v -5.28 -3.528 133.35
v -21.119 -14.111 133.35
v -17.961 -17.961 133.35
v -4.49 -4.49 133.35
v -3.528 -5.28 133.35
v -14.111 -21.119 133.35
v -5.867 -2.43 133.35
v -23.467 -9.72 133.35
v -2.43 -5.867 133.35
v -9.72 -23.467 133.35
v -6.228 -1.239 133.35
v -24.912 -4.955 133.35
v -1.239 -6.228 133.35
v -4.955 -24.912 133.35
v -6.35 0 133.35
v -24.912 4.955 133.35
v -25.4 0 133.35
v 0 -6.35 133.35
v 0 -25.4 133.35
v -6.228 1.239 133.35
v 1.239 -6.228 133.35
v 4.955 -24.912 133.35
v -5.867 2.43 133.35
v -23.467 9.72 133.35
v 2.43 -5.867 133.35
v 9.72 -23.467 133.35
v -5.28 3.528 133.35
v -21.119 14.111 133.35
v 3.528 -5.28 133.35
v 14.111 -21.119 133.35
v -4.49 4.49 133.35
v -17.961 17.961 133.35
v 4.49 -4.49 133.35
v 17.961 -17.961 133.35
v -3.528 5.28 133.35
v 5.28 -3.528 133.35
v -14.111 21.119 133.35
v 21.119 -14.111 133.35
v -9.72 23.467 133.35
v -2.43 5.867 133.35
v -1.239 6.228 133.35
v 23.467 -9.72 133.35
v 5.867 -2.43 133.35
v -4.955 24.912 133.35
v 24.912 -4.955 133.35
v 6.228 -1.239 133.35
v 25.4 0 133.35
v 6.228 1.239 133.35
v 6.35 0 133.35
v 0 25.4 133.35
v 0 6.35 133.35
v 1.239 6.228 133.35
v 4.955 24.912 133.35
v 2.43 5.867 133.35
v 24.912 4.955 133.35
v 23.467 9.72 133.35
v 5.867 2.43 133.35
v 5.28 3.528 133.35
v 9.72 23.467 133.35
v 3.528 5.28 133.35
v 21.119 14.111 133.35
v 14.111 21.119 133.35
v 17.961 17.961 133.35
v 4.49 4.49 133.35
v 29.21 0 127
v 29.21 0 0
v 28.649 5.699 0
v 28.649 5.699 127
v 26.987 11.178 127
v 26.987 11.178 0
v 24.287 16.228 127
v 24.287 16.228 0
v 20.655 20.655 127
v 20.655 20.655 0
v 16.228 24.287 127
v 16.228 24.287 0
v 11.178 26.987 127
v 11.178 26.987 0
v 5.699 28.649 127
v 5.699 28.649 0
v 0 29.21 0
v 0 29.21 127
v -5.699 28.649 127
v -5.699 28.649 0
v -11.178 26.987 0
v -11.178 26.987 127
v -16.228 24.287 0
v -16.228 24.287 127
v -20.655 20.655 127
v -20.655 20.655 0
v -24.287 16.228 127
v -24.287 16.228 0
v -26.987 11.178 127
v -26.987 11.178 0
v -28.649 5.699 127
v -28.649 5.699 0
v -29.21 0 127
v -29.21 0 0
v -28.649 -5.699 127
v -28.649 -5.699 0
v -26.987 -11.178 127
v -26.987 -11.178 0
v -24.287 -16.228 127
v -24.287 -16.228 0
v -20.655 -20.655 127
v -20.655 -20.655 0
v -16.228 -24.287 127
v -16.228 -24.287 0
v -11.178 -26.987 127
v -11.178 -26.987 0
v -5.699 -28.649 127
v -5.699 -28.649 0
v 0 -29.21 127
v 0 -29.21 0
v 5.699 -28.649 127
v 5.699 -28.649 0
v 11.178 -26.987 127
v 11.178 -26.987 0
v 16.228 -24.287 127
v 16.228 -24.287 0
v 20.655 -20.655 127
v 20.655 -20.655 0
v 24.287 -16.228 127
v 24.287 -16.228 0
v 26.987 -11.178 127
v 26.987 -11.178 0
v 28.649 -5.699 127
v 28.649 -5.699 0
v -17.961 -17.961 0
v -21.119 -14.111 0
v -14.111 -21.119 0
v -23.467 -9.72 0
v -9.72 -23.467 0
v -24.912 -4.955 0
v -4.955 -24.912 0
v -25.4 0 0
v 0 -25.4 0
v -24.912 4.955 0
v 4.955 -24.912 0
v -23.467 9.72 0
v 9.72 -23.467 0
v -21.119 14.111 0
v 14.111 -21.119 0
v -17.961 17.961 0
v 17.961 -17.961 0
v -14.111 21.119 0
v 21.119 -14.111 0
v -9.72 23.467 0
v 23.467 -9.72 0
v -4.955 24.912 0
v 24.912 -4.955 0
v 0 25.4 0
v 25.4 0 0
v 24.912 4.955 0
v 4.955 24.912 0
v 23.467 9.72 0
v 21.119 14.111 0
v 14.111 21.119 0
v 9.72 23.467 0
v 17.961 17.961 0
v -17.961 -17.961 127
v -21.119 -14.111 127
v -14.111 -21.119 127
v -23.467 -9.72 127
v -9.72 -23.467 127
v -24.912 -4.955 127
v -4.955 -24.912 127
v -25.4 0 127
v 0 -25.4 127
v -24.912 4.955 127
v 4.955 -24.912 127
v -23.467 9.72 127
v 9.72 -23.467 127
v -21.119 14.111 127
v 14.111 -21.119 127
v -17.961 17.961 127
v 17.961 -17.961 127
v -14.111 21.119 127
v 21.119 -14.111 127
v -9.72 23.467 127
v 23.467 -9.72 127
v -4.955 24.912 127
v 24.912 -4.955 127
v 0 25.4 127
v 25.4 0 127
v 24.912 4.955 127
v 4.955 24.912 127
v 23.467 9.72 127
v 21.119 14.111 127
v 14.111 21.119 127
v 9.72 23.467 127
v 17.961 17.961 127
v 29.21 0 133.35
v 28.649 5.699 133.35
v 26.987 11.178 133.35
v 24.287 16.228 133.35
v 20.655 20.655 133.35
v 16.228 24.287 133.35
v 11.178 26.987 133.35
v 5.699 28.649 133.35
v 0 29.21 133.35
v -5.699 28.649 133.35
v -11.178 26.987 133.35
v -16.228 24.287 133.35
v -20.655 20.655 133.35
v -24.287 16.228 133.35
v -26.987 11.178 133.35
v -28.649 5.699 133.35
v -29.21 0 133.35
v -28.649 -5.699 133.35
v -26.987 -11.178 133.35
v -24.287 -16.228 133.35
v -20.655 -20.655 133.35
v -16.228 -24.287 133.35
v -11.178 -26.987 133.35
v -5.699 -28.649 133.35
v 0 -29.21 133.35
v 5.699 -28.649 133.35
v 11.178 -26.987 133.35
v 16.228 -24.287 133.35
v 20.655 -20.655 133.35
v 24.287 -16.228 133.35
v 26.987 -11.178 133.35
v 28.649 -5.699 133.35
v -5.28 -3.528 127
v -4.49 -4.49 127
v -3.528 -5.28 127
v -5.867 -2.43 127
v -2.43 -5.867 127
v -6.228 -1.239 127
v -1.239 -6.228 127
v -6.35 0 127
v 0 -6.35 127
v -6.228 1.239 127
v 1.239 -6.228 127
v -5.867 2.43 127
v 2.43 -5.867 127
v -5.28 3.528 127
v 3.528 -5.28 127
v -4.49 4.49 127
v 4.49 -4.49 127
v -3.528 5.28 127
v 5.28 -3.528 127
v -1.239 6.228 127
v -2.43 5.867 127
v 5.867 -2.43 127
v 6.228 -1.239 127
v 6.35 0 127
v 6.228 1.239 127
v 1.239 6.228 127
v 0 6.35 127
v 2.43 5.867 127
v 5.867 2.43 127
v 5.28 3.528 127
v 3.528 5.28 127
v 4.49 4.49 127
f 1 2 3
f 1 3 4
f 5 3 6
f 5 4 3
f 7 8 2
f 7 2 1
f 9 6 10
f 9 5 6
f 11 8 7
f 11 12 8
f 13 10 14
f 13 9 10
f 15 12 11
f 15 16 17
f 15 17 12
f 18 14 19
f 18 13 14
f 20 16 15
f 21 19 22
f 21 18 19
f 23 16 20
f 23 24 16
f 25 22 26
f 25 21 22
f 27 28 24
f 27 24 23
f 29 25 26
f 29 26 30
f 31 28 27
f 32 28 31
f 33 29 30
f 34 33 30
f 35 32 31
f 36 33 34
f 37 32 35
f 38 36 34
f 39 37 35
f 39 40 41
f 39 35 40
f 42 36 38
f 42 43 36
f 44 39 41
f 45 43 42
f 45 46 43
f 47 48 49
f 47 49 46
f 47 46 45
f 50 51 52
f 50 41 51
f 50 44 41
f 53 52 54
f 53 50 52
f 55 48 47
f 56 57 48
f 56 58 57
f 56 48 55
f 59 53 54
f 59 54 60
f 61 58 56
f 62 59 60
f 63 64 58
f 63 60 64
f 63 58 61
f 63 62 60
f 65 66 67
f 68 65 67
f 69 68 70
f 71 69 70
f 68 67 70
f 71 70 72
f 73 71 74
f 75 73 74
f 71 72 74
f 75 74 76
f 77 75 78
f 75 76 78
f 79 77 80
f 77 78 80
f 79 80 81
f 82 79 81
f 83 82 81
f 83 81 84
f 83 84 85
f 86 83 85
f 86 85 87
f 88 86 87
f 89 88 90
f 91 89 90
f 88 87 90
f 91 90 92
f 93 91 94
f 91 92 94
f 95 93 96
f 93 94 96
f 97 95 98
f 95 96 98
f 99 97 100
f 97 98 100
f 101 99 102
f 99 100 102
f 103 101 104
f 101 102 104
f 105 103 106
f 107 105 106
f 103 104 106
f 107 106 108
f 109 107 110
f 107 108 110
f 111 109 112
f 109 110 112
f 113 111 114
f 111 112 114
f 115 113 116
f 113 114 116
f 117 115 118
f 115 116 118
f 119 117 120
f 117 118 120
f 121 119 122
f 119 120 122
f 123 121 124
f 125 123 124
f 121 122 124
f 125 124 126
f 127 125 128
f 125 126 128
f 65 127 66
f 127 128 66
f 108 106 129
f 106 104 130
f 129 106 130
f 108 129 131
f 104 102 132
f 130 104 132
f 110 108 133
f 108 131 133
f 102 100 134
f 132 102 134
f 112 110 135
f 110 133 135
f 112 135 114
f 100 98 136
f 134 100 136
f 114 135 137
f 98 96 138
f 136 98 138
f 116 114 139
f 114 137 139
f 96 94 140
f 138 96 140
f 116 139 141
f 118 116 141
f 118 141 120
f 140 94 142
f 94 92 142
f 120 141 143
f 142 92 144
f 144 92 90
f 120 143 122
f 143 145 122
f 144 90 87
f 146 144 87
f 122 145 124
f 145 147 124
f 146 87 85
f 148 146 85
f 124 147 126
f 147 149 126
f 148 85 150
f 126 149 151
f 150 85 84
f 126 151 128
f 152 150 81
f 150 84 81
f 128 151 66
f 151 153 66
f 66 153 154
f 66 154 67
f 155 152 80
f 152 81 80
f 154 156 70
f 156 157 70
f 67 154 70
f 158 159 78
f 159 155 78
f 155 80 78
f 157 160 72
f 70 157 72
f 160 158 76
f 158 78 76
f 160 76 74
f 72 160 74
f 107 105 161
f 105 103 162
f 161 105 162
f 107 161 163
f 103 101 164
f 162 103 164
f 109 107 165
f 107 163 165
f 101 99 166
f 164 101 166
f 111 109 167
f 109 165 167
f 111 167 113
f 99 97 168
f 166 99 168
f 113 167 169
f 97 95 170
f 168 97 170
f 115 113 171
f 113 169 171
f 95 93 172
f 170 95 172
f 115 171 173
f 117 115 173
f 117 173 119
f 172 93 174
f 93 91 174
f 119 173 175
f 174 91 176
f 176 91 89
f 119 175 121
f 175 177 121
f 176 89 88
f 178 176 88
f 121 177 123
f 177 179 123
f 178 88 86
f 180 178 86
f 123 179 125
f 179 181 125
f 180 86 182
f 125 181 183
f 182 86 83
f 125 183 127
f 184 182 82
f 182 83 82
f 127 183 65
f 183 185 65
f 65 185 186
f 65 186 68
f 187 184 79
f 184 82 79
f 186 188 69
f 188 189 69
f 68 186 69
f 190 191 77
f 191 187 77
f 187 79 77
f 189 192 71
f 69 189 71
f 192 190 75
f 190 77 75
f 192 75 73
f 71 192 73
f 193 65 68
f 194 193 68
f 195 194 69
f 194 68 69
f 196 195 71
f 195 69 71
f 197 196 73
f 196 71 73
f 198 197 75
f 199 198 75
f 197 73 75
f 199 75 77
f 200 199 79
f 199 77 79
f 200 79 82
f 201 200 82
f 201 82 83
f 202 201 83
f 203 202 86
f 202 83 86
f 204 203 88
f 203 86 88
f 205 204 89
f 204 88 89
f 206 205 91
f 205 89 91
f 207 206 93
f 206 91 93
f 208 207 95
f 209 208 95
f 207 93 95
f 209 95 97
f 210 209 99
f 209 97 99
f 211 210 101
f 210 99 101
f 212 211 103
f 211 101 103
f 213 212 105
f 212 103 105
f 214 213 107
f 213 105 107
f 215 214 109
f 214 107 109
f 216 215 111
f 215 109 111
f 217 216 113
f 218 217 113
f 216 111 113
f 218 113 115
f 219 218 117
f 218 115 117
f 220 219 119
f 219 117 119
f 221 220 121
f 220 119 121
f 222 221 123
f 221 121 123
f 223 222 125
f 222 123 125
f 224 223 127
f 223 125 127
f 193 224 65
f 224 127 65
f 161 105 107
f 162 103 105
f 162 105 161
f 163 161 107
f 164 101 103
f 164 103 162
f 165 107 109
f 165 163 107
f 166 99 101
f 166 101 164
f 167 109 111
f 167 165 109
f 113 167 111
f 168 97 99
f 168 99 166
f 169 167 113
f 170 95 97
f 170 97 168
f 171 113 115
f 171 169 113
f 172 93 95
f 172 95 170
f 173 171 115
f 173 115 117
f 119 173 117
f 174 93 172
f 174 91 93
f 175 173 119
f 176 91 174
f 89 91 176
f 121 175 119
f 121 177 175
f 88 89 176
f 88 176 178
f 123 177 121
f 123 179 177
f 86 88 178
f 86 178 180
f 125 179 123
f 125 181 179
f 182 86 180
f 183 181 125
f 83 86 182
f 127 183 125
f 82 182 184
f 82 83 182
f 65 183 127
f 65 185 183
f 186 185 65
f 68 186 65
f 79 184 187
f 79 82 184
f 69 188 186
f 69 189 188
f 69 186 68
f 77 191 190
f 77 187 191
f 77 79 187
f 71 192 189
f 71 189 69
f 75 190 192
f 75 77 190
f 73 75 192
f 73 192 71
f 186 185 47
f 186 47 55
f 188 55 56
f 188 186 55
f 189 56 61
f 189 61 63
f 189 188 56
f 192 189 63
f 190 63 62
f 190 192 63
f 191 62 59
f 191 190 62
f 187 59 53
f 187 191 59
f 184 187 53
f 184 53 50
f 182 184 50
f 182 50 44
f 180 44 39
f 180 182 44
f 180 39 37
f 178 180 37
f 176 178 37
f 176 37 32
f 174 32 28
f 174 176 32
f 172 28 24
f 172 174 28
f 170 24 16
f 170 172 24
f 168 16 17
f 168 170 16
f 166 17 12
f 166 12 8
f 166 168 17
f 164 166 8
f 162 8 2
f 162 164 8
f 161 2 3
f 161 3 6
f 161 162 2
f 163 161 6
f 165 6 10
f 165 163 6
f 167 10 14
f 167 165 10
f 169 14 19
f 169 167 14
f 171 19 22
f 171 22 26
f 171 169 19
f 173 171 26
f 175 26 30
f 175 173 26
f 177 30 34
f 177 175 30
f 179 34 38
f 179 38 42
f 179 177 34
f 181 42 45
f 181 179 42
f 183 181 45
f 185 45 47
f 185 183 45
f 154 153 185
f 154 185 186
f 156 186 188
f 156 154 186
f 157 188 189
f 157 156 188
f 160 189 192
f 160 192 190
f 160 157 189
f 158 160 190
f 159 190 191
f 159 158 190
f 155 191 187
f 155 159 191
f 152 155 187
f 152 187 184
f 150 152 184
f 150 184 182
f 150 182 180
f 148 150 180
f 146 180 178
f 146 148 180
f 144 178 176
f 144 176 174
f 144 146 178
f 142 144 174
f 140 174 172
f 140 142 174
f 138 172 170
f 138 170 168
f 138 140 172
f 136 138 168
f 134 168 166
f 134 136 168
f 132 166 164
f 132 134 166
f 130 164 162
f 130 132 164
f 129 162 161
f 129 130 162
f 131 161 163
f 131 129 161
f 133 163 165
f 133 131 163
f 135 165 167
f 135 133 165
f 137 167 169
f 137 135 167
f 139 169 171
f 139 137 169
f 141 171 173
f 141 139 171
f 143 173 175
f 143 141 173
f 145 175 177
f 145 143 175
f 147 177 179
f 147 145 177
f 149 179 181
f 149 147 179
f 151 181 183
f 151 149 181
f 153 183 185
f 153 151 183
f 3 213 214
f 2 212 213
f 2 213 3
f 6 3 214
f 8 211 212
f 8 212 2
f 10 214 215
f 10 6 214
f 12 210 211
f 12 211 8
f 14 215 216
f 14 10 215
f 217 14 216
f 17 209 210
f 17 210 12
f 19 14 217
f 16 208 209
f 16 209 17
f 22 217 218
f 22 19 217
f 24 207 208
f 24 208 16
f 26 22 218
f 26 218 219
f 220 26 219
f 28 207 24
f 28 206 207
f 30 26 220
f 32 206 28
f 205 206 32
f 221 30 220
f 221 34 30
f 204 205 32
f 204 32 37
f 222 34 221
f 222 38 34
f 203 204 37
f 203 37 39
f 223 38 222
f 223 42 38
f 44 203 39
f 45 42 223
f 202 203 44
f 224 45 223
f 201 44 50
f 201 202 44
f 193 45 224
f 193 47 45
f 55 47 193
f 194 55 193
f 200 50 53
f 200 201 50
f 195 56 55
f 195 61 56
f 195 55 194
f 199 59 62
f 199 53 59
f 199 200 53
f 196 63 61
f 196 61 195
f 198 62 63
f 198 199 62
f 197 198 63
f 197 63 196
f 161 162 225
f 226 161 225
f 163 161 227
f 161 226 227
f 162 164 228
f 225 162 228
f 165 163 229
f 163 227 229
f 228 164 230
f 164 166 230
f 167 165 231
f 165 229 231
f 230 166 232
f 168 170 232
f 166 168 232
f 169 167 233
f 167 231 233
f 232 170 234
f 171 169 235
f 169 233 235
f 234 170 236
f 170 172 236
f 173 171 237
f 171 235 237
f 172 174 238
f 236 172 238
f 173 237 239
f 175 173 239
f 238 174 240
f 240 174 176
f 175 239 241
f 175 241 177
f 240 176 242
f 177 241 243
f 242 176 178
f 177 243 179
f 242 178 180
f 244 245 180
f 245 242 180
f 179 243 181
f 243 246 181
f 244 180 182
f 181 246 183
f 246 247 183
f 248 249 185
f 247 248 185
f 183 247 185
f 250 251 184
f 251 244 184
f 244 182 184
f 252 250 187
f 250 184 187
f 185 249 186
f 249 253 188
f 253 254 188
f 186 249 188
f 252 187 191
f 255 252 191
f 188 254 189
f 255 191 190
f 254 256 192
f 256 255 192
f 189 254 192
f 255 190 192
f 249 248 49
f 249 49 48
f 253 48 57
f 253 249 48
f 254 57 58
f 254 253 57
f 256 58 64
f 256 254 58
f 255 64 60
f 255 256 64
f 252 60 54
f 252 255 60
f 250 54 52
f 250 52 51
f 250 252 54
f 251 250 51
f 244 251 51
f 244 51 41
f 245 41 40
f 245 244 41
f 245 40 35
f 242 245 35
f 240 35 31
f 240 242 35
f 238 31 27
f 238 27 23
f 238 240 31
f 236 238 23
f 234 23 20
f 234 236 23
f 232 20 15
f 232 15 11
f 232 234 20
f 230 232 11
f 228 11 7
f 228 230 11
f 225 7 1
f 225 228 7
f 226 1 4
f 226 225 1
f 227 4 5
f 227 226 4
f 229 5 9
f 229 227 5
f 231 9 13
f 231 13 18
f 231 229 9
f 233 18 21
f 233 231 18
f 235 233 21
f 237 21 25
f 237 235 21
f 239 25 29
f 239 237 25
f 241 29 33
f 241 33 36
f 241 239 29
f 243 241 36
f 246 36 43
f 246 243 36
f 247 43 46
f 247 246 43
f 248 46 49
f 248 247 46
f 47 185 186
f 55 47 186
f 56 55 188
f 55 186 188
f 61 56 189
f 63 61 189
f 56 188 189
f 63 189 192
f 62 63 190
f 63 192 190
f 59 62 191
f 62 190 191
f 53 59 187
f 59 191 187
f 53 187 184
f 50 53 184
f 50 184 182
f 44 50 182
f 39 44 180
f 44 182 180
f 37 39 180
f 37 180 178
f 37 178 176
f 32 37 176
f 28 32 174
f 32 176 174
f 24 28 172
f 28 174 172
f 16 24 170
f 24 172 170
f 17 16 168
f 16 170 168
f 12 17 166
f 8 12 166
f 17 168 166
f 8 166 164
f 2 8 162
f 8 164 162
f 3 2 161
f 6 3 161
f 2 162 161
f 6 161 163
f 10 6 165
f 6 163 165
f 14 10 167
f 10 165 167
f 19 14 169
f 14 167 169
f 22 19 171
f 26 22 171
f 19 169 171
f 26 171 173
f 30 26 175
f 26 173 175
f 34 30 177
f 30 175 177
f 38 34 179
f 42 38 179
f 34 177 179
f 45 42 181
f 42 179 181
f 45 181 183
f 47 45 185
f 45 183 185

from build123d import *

# Parameters (mm, degrees)
F0_R        = 29.21
F0_R_2      = 25.4
F1_DEPTH    = 127
F2_R        = 25.4
F2_R_2      = 6.35
F3_DEPTH    = 6.35
F1_FACE_R   = 29.21
F1_FACE_R_2 = 25.4
F4_DEPTH    = 6.35


with BuildPart() as f1:
    # F0 (on Top) → F1 (new body)
    with BuildSketch(Plane.XY):
        Circle(F0_R)
        Circle(F0_R_2, mode=Mode.SUBTRACT)
    extrude(amount=F1_DEPTH)


with BuildPart() as f3:
    # F2 (on face) → F3 (new body)
    with BuildSketch(Plane.XY.offset(127)):
        Circle(F2_R)
        Circle(F2_R_2, mode=Mode.SUBTRACT)
    extrude(amount=F3_DEPTH)


with BuildPart() as f4:
    # F1_face (on face) → F4 (new body)
    with BuildSketch(Plane.XY.offset(127)):
        Circle(F1_FACE_R)
        Circle(F1_FACE_R_2, mode=Mode.SUBTRACT)
    extrude(amount=F4_DEPTH)


solid = Compound([f1.part, f3.part, f4.part])
